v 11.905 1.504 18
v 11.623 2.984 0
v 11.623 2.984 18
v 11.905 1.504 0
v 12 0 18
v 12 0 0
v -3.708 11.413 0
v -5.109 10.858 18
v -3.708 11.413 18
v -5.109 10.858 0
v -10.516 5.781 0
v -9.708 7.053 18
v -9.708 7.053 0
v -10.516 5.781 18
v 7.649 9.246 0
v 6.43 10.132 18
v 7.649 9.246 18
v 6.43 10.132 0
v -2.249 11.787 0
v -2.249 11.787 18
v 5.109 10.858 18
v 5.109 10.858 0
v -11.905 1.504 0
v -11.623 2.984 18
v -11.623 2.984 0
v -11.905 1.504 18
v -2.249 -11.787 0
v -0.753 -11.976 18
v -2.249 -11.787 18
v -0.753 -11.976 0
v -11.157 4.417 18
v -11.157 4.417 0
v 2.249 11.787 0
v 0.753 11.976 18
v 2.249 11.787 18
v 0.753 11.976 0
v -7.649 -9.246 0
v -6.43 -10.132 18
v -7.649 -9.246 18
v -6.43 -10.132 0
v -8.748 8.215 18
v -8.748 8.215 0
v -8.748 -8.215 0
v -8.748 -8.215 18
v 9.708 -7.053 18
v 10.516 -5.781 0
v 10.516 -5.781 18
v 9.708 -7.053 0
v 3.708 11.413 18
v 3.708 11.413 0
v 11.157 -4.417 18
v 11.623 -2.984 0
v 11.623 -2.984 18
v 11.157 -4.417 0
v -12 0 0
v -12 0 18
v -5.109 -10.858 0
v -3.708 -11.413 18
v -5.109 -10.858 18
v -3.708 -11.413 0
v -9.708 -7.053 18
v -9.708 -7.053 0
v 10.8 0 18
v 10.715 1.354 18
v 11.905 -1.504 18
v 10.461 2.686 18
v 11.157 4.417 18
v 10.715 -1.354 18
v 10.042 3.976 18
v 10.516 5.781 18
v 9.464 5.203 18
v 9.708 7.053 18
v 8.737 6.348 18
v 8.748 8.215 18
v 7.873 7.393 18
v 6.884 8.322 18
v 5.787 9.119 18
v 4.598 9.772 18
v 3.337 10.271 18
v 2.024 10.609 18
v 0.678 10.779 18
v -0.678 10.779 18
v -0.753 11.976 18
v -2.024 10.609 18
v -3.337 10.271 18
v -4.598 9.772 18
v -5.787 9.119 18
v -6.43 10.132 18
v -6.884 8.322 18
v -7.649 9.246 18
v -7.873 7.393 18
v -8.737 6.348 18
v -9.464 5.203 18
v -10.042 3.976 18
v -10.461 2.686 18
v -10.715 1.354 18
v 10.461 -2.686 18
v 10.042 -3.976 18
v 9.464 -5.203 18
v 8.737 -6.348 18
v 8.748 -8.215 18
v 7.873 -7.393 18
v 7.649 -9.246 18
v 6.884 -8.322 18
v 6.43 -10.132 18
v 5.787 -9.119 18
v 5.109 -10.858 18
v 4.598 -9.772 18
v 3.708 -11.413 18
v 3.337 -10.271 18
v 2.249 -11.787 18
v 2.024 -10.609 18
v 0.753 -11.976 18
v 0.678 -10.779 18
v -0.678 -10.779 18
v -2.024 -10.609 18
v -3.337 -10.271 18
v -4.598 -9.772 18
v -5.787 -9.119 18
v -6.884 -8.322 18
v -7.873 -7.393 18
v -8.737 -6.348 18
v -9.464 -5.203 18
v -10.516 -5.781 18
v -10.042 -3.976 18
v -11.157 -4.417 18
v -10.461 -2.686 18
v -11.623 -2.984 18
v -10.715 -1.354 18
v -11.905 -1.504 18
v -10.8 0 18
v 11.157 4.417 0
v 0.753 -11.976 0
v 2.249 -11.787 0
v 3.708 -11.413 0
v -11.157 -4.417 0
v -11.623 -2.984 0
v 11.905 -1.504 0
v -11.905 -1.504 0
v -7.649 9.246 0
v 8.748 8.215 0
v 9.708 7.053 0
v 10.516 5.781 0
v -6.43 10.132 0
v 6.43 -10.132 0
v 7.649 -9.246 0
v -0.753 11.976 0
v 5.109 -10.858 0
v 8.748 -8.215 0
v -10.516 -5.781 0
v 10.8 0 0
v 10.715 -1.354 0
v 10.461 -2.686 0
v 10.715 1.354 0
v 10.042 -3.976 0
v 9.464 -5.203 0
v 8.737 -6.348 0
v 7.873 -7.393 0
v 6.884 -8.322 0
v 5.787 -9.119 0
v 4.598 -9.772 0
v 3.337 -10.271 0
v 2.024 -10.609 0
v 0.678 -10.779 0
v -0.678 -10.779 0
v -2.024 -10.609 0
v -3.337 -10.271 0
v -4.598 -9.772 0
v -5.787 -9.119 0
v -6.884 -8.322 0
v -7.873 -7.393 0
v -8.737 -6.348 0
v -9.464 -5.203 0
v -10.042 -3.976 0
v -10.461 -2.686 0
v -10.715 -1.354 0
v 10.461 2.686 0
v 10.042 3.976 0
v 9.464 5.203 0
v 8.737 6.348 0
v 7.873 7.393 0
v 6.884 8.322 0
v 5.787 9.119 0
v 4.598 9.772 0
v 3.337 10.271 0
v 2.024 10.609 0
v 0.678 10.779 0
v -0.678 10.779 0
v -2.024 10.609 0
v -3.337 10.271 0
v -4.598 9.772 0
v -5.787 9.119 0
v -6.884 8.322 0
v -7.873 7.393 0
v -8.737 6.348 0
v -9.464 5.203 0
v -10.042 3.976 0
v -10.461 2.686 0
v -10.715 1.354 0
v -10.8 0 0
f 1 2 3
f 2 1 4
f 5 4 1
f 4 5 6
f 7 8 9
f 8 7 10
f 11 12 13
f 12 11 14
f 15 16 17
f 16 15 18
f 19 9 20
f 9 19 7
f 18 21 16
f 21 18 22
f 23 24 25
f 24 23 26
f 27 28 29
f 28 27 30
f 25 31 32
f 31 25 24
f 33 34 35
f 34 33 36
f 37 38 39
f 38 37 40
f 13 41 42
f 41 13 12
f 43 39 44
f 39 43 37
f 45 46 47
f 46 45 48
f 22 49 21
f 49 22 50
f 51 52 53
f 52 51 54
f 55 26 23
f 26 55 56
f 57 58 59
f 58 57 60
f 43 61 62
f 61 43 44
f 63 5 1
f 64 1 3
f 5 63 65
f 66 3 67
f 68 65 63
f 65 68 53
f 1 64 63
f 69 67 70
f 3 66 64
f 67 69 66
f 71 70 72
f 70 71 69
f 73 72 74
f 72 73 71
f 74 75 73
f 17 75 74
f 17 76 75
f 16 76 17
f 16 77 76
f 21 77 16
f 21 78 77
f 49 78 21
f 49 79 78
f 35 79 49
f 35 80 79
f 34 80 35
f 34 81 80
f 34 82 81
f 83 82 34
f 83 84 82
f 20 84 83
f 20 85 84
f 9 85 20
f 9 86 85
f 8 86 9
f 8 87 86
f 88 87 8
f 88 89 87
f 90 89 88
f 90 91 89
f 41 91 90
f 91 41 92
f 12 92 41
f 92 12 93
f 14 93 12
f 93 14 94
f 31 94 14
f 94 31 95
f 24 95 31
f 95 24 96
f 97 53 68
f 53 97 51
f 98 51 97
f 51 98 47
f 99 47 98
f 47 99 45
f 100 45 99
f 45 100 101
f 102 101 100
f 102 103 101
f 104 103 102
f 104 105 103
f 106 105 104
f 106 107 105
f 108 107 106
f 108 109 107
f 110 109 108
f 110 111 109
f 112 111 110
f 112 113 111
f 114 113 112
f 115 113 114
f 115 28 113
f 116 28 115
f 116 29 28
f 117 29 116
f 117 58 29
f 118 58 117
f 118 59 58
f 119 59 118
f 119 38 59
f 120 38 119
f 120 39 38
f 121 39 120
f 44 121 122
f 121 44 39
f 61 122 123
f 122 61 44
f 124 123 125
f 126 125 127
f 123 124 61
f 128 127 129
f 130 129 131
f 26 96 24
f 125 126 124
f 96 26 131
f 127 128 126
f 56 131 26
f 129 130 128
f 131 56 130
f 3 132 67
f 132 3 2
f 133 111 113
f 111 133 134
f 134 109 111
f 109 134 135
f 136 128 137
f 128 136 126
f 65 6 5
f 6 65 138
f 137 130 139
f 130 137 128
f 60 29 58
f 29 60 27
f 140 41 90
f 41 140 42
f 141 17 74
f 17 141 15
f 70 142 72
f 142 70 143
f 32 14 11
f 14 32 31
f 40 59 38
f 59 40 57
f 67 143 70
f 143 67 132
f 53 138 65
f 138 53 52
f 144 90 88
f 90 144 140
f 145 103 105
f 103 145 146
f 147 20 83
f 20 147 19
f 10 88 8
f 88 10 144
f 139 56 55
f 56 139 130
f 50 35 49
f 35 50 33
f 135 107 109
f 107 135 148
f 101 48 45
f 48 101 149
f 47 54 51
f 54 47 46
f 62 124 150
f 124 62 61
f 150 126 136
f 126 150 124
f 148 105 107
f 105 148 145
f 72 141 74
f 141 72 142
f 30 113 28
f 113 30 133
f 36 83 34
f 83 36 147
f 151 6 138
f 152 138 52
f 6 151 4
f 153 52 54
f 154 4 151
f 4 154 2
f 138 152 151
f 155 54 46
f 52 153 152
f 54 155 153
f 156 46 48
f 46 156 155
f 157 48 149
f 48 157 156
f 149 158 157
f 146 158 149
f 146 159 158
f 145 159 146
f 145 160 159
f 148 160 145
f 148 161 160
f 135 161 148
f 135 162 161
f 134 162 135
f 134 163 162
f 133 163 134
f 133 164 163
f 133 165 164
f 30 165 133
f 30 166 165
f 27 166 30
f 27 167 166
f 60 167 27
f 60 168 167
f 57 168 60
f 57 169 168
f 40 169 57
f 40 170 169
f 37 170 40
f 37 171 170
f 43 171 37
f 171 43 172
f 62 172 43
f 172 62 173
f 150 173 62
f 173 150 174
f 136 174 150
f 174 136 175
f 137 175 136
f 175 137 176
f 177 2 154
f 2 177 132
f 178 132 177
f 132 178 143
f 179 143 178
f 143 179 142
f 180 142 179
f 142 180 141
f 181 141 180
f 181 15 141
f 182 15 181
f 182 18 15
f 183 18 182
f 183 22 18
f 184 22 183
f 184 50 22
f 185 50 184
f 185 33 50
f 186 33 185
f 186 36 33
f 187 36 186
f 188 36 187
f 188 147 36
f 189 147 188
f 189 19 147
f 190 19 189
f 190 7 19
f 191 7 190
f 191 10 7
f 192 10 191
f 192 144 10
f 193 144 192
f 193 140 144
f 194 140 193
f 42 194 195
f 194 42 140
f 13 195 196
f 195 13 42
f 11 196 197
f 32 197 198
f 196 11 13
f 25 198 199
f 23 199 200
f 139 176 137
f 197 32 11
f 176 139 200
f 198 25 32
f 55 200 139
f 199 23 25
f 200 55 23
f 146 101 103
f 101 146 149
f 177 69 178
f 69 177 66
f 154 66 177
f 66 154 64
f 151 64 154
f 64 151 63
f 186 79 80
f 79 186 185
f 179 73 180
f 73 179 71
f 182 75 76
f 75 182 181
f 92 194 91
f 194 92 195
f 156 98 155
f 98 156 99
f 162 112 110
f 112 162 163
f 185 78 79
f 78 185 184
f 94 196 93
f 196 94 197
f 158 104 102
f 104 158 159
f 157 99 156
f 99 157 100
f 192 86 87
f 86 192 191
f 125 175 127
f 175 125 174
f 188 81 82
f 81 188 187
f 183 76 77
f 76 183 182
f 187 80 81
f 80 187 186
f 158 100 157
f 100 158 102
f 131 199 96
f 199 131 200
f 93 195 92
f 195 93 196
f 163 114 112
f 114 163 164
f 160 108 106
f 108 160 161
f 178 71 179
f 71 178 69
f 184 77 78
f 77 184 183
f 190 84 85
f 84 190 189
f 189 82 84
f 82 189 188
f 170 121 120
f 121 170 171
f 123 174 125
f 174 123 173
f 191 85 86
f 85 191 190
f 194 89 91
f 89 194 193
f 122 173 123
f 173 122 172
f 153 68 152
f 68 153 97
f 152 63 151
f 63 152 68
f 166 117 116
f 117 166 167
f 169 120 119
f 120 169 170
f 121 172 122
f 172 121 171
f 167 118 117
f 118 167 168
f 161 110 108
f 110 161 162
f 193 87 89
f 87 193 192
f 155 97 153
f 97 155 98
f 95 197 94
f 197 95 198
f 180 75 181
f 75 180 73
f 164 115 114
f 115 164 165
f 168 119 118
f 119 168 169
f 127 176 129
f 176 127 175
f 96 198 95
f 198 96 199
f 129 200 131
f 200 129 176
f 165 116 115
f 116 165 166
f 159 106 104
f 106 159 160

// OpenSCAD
$fn = 50;

difference() {
	union() {
		translate(v = [0, 0, 0]) {
			rotate(a = [0, 0, 0]) {
				difference() {
					union() {
						cylinder(h = 18, r = 12);
					}
					union() {
						cylinder(h = 18, r = 10.8);
					}
				}
			}
		}
	}
	union();
}
